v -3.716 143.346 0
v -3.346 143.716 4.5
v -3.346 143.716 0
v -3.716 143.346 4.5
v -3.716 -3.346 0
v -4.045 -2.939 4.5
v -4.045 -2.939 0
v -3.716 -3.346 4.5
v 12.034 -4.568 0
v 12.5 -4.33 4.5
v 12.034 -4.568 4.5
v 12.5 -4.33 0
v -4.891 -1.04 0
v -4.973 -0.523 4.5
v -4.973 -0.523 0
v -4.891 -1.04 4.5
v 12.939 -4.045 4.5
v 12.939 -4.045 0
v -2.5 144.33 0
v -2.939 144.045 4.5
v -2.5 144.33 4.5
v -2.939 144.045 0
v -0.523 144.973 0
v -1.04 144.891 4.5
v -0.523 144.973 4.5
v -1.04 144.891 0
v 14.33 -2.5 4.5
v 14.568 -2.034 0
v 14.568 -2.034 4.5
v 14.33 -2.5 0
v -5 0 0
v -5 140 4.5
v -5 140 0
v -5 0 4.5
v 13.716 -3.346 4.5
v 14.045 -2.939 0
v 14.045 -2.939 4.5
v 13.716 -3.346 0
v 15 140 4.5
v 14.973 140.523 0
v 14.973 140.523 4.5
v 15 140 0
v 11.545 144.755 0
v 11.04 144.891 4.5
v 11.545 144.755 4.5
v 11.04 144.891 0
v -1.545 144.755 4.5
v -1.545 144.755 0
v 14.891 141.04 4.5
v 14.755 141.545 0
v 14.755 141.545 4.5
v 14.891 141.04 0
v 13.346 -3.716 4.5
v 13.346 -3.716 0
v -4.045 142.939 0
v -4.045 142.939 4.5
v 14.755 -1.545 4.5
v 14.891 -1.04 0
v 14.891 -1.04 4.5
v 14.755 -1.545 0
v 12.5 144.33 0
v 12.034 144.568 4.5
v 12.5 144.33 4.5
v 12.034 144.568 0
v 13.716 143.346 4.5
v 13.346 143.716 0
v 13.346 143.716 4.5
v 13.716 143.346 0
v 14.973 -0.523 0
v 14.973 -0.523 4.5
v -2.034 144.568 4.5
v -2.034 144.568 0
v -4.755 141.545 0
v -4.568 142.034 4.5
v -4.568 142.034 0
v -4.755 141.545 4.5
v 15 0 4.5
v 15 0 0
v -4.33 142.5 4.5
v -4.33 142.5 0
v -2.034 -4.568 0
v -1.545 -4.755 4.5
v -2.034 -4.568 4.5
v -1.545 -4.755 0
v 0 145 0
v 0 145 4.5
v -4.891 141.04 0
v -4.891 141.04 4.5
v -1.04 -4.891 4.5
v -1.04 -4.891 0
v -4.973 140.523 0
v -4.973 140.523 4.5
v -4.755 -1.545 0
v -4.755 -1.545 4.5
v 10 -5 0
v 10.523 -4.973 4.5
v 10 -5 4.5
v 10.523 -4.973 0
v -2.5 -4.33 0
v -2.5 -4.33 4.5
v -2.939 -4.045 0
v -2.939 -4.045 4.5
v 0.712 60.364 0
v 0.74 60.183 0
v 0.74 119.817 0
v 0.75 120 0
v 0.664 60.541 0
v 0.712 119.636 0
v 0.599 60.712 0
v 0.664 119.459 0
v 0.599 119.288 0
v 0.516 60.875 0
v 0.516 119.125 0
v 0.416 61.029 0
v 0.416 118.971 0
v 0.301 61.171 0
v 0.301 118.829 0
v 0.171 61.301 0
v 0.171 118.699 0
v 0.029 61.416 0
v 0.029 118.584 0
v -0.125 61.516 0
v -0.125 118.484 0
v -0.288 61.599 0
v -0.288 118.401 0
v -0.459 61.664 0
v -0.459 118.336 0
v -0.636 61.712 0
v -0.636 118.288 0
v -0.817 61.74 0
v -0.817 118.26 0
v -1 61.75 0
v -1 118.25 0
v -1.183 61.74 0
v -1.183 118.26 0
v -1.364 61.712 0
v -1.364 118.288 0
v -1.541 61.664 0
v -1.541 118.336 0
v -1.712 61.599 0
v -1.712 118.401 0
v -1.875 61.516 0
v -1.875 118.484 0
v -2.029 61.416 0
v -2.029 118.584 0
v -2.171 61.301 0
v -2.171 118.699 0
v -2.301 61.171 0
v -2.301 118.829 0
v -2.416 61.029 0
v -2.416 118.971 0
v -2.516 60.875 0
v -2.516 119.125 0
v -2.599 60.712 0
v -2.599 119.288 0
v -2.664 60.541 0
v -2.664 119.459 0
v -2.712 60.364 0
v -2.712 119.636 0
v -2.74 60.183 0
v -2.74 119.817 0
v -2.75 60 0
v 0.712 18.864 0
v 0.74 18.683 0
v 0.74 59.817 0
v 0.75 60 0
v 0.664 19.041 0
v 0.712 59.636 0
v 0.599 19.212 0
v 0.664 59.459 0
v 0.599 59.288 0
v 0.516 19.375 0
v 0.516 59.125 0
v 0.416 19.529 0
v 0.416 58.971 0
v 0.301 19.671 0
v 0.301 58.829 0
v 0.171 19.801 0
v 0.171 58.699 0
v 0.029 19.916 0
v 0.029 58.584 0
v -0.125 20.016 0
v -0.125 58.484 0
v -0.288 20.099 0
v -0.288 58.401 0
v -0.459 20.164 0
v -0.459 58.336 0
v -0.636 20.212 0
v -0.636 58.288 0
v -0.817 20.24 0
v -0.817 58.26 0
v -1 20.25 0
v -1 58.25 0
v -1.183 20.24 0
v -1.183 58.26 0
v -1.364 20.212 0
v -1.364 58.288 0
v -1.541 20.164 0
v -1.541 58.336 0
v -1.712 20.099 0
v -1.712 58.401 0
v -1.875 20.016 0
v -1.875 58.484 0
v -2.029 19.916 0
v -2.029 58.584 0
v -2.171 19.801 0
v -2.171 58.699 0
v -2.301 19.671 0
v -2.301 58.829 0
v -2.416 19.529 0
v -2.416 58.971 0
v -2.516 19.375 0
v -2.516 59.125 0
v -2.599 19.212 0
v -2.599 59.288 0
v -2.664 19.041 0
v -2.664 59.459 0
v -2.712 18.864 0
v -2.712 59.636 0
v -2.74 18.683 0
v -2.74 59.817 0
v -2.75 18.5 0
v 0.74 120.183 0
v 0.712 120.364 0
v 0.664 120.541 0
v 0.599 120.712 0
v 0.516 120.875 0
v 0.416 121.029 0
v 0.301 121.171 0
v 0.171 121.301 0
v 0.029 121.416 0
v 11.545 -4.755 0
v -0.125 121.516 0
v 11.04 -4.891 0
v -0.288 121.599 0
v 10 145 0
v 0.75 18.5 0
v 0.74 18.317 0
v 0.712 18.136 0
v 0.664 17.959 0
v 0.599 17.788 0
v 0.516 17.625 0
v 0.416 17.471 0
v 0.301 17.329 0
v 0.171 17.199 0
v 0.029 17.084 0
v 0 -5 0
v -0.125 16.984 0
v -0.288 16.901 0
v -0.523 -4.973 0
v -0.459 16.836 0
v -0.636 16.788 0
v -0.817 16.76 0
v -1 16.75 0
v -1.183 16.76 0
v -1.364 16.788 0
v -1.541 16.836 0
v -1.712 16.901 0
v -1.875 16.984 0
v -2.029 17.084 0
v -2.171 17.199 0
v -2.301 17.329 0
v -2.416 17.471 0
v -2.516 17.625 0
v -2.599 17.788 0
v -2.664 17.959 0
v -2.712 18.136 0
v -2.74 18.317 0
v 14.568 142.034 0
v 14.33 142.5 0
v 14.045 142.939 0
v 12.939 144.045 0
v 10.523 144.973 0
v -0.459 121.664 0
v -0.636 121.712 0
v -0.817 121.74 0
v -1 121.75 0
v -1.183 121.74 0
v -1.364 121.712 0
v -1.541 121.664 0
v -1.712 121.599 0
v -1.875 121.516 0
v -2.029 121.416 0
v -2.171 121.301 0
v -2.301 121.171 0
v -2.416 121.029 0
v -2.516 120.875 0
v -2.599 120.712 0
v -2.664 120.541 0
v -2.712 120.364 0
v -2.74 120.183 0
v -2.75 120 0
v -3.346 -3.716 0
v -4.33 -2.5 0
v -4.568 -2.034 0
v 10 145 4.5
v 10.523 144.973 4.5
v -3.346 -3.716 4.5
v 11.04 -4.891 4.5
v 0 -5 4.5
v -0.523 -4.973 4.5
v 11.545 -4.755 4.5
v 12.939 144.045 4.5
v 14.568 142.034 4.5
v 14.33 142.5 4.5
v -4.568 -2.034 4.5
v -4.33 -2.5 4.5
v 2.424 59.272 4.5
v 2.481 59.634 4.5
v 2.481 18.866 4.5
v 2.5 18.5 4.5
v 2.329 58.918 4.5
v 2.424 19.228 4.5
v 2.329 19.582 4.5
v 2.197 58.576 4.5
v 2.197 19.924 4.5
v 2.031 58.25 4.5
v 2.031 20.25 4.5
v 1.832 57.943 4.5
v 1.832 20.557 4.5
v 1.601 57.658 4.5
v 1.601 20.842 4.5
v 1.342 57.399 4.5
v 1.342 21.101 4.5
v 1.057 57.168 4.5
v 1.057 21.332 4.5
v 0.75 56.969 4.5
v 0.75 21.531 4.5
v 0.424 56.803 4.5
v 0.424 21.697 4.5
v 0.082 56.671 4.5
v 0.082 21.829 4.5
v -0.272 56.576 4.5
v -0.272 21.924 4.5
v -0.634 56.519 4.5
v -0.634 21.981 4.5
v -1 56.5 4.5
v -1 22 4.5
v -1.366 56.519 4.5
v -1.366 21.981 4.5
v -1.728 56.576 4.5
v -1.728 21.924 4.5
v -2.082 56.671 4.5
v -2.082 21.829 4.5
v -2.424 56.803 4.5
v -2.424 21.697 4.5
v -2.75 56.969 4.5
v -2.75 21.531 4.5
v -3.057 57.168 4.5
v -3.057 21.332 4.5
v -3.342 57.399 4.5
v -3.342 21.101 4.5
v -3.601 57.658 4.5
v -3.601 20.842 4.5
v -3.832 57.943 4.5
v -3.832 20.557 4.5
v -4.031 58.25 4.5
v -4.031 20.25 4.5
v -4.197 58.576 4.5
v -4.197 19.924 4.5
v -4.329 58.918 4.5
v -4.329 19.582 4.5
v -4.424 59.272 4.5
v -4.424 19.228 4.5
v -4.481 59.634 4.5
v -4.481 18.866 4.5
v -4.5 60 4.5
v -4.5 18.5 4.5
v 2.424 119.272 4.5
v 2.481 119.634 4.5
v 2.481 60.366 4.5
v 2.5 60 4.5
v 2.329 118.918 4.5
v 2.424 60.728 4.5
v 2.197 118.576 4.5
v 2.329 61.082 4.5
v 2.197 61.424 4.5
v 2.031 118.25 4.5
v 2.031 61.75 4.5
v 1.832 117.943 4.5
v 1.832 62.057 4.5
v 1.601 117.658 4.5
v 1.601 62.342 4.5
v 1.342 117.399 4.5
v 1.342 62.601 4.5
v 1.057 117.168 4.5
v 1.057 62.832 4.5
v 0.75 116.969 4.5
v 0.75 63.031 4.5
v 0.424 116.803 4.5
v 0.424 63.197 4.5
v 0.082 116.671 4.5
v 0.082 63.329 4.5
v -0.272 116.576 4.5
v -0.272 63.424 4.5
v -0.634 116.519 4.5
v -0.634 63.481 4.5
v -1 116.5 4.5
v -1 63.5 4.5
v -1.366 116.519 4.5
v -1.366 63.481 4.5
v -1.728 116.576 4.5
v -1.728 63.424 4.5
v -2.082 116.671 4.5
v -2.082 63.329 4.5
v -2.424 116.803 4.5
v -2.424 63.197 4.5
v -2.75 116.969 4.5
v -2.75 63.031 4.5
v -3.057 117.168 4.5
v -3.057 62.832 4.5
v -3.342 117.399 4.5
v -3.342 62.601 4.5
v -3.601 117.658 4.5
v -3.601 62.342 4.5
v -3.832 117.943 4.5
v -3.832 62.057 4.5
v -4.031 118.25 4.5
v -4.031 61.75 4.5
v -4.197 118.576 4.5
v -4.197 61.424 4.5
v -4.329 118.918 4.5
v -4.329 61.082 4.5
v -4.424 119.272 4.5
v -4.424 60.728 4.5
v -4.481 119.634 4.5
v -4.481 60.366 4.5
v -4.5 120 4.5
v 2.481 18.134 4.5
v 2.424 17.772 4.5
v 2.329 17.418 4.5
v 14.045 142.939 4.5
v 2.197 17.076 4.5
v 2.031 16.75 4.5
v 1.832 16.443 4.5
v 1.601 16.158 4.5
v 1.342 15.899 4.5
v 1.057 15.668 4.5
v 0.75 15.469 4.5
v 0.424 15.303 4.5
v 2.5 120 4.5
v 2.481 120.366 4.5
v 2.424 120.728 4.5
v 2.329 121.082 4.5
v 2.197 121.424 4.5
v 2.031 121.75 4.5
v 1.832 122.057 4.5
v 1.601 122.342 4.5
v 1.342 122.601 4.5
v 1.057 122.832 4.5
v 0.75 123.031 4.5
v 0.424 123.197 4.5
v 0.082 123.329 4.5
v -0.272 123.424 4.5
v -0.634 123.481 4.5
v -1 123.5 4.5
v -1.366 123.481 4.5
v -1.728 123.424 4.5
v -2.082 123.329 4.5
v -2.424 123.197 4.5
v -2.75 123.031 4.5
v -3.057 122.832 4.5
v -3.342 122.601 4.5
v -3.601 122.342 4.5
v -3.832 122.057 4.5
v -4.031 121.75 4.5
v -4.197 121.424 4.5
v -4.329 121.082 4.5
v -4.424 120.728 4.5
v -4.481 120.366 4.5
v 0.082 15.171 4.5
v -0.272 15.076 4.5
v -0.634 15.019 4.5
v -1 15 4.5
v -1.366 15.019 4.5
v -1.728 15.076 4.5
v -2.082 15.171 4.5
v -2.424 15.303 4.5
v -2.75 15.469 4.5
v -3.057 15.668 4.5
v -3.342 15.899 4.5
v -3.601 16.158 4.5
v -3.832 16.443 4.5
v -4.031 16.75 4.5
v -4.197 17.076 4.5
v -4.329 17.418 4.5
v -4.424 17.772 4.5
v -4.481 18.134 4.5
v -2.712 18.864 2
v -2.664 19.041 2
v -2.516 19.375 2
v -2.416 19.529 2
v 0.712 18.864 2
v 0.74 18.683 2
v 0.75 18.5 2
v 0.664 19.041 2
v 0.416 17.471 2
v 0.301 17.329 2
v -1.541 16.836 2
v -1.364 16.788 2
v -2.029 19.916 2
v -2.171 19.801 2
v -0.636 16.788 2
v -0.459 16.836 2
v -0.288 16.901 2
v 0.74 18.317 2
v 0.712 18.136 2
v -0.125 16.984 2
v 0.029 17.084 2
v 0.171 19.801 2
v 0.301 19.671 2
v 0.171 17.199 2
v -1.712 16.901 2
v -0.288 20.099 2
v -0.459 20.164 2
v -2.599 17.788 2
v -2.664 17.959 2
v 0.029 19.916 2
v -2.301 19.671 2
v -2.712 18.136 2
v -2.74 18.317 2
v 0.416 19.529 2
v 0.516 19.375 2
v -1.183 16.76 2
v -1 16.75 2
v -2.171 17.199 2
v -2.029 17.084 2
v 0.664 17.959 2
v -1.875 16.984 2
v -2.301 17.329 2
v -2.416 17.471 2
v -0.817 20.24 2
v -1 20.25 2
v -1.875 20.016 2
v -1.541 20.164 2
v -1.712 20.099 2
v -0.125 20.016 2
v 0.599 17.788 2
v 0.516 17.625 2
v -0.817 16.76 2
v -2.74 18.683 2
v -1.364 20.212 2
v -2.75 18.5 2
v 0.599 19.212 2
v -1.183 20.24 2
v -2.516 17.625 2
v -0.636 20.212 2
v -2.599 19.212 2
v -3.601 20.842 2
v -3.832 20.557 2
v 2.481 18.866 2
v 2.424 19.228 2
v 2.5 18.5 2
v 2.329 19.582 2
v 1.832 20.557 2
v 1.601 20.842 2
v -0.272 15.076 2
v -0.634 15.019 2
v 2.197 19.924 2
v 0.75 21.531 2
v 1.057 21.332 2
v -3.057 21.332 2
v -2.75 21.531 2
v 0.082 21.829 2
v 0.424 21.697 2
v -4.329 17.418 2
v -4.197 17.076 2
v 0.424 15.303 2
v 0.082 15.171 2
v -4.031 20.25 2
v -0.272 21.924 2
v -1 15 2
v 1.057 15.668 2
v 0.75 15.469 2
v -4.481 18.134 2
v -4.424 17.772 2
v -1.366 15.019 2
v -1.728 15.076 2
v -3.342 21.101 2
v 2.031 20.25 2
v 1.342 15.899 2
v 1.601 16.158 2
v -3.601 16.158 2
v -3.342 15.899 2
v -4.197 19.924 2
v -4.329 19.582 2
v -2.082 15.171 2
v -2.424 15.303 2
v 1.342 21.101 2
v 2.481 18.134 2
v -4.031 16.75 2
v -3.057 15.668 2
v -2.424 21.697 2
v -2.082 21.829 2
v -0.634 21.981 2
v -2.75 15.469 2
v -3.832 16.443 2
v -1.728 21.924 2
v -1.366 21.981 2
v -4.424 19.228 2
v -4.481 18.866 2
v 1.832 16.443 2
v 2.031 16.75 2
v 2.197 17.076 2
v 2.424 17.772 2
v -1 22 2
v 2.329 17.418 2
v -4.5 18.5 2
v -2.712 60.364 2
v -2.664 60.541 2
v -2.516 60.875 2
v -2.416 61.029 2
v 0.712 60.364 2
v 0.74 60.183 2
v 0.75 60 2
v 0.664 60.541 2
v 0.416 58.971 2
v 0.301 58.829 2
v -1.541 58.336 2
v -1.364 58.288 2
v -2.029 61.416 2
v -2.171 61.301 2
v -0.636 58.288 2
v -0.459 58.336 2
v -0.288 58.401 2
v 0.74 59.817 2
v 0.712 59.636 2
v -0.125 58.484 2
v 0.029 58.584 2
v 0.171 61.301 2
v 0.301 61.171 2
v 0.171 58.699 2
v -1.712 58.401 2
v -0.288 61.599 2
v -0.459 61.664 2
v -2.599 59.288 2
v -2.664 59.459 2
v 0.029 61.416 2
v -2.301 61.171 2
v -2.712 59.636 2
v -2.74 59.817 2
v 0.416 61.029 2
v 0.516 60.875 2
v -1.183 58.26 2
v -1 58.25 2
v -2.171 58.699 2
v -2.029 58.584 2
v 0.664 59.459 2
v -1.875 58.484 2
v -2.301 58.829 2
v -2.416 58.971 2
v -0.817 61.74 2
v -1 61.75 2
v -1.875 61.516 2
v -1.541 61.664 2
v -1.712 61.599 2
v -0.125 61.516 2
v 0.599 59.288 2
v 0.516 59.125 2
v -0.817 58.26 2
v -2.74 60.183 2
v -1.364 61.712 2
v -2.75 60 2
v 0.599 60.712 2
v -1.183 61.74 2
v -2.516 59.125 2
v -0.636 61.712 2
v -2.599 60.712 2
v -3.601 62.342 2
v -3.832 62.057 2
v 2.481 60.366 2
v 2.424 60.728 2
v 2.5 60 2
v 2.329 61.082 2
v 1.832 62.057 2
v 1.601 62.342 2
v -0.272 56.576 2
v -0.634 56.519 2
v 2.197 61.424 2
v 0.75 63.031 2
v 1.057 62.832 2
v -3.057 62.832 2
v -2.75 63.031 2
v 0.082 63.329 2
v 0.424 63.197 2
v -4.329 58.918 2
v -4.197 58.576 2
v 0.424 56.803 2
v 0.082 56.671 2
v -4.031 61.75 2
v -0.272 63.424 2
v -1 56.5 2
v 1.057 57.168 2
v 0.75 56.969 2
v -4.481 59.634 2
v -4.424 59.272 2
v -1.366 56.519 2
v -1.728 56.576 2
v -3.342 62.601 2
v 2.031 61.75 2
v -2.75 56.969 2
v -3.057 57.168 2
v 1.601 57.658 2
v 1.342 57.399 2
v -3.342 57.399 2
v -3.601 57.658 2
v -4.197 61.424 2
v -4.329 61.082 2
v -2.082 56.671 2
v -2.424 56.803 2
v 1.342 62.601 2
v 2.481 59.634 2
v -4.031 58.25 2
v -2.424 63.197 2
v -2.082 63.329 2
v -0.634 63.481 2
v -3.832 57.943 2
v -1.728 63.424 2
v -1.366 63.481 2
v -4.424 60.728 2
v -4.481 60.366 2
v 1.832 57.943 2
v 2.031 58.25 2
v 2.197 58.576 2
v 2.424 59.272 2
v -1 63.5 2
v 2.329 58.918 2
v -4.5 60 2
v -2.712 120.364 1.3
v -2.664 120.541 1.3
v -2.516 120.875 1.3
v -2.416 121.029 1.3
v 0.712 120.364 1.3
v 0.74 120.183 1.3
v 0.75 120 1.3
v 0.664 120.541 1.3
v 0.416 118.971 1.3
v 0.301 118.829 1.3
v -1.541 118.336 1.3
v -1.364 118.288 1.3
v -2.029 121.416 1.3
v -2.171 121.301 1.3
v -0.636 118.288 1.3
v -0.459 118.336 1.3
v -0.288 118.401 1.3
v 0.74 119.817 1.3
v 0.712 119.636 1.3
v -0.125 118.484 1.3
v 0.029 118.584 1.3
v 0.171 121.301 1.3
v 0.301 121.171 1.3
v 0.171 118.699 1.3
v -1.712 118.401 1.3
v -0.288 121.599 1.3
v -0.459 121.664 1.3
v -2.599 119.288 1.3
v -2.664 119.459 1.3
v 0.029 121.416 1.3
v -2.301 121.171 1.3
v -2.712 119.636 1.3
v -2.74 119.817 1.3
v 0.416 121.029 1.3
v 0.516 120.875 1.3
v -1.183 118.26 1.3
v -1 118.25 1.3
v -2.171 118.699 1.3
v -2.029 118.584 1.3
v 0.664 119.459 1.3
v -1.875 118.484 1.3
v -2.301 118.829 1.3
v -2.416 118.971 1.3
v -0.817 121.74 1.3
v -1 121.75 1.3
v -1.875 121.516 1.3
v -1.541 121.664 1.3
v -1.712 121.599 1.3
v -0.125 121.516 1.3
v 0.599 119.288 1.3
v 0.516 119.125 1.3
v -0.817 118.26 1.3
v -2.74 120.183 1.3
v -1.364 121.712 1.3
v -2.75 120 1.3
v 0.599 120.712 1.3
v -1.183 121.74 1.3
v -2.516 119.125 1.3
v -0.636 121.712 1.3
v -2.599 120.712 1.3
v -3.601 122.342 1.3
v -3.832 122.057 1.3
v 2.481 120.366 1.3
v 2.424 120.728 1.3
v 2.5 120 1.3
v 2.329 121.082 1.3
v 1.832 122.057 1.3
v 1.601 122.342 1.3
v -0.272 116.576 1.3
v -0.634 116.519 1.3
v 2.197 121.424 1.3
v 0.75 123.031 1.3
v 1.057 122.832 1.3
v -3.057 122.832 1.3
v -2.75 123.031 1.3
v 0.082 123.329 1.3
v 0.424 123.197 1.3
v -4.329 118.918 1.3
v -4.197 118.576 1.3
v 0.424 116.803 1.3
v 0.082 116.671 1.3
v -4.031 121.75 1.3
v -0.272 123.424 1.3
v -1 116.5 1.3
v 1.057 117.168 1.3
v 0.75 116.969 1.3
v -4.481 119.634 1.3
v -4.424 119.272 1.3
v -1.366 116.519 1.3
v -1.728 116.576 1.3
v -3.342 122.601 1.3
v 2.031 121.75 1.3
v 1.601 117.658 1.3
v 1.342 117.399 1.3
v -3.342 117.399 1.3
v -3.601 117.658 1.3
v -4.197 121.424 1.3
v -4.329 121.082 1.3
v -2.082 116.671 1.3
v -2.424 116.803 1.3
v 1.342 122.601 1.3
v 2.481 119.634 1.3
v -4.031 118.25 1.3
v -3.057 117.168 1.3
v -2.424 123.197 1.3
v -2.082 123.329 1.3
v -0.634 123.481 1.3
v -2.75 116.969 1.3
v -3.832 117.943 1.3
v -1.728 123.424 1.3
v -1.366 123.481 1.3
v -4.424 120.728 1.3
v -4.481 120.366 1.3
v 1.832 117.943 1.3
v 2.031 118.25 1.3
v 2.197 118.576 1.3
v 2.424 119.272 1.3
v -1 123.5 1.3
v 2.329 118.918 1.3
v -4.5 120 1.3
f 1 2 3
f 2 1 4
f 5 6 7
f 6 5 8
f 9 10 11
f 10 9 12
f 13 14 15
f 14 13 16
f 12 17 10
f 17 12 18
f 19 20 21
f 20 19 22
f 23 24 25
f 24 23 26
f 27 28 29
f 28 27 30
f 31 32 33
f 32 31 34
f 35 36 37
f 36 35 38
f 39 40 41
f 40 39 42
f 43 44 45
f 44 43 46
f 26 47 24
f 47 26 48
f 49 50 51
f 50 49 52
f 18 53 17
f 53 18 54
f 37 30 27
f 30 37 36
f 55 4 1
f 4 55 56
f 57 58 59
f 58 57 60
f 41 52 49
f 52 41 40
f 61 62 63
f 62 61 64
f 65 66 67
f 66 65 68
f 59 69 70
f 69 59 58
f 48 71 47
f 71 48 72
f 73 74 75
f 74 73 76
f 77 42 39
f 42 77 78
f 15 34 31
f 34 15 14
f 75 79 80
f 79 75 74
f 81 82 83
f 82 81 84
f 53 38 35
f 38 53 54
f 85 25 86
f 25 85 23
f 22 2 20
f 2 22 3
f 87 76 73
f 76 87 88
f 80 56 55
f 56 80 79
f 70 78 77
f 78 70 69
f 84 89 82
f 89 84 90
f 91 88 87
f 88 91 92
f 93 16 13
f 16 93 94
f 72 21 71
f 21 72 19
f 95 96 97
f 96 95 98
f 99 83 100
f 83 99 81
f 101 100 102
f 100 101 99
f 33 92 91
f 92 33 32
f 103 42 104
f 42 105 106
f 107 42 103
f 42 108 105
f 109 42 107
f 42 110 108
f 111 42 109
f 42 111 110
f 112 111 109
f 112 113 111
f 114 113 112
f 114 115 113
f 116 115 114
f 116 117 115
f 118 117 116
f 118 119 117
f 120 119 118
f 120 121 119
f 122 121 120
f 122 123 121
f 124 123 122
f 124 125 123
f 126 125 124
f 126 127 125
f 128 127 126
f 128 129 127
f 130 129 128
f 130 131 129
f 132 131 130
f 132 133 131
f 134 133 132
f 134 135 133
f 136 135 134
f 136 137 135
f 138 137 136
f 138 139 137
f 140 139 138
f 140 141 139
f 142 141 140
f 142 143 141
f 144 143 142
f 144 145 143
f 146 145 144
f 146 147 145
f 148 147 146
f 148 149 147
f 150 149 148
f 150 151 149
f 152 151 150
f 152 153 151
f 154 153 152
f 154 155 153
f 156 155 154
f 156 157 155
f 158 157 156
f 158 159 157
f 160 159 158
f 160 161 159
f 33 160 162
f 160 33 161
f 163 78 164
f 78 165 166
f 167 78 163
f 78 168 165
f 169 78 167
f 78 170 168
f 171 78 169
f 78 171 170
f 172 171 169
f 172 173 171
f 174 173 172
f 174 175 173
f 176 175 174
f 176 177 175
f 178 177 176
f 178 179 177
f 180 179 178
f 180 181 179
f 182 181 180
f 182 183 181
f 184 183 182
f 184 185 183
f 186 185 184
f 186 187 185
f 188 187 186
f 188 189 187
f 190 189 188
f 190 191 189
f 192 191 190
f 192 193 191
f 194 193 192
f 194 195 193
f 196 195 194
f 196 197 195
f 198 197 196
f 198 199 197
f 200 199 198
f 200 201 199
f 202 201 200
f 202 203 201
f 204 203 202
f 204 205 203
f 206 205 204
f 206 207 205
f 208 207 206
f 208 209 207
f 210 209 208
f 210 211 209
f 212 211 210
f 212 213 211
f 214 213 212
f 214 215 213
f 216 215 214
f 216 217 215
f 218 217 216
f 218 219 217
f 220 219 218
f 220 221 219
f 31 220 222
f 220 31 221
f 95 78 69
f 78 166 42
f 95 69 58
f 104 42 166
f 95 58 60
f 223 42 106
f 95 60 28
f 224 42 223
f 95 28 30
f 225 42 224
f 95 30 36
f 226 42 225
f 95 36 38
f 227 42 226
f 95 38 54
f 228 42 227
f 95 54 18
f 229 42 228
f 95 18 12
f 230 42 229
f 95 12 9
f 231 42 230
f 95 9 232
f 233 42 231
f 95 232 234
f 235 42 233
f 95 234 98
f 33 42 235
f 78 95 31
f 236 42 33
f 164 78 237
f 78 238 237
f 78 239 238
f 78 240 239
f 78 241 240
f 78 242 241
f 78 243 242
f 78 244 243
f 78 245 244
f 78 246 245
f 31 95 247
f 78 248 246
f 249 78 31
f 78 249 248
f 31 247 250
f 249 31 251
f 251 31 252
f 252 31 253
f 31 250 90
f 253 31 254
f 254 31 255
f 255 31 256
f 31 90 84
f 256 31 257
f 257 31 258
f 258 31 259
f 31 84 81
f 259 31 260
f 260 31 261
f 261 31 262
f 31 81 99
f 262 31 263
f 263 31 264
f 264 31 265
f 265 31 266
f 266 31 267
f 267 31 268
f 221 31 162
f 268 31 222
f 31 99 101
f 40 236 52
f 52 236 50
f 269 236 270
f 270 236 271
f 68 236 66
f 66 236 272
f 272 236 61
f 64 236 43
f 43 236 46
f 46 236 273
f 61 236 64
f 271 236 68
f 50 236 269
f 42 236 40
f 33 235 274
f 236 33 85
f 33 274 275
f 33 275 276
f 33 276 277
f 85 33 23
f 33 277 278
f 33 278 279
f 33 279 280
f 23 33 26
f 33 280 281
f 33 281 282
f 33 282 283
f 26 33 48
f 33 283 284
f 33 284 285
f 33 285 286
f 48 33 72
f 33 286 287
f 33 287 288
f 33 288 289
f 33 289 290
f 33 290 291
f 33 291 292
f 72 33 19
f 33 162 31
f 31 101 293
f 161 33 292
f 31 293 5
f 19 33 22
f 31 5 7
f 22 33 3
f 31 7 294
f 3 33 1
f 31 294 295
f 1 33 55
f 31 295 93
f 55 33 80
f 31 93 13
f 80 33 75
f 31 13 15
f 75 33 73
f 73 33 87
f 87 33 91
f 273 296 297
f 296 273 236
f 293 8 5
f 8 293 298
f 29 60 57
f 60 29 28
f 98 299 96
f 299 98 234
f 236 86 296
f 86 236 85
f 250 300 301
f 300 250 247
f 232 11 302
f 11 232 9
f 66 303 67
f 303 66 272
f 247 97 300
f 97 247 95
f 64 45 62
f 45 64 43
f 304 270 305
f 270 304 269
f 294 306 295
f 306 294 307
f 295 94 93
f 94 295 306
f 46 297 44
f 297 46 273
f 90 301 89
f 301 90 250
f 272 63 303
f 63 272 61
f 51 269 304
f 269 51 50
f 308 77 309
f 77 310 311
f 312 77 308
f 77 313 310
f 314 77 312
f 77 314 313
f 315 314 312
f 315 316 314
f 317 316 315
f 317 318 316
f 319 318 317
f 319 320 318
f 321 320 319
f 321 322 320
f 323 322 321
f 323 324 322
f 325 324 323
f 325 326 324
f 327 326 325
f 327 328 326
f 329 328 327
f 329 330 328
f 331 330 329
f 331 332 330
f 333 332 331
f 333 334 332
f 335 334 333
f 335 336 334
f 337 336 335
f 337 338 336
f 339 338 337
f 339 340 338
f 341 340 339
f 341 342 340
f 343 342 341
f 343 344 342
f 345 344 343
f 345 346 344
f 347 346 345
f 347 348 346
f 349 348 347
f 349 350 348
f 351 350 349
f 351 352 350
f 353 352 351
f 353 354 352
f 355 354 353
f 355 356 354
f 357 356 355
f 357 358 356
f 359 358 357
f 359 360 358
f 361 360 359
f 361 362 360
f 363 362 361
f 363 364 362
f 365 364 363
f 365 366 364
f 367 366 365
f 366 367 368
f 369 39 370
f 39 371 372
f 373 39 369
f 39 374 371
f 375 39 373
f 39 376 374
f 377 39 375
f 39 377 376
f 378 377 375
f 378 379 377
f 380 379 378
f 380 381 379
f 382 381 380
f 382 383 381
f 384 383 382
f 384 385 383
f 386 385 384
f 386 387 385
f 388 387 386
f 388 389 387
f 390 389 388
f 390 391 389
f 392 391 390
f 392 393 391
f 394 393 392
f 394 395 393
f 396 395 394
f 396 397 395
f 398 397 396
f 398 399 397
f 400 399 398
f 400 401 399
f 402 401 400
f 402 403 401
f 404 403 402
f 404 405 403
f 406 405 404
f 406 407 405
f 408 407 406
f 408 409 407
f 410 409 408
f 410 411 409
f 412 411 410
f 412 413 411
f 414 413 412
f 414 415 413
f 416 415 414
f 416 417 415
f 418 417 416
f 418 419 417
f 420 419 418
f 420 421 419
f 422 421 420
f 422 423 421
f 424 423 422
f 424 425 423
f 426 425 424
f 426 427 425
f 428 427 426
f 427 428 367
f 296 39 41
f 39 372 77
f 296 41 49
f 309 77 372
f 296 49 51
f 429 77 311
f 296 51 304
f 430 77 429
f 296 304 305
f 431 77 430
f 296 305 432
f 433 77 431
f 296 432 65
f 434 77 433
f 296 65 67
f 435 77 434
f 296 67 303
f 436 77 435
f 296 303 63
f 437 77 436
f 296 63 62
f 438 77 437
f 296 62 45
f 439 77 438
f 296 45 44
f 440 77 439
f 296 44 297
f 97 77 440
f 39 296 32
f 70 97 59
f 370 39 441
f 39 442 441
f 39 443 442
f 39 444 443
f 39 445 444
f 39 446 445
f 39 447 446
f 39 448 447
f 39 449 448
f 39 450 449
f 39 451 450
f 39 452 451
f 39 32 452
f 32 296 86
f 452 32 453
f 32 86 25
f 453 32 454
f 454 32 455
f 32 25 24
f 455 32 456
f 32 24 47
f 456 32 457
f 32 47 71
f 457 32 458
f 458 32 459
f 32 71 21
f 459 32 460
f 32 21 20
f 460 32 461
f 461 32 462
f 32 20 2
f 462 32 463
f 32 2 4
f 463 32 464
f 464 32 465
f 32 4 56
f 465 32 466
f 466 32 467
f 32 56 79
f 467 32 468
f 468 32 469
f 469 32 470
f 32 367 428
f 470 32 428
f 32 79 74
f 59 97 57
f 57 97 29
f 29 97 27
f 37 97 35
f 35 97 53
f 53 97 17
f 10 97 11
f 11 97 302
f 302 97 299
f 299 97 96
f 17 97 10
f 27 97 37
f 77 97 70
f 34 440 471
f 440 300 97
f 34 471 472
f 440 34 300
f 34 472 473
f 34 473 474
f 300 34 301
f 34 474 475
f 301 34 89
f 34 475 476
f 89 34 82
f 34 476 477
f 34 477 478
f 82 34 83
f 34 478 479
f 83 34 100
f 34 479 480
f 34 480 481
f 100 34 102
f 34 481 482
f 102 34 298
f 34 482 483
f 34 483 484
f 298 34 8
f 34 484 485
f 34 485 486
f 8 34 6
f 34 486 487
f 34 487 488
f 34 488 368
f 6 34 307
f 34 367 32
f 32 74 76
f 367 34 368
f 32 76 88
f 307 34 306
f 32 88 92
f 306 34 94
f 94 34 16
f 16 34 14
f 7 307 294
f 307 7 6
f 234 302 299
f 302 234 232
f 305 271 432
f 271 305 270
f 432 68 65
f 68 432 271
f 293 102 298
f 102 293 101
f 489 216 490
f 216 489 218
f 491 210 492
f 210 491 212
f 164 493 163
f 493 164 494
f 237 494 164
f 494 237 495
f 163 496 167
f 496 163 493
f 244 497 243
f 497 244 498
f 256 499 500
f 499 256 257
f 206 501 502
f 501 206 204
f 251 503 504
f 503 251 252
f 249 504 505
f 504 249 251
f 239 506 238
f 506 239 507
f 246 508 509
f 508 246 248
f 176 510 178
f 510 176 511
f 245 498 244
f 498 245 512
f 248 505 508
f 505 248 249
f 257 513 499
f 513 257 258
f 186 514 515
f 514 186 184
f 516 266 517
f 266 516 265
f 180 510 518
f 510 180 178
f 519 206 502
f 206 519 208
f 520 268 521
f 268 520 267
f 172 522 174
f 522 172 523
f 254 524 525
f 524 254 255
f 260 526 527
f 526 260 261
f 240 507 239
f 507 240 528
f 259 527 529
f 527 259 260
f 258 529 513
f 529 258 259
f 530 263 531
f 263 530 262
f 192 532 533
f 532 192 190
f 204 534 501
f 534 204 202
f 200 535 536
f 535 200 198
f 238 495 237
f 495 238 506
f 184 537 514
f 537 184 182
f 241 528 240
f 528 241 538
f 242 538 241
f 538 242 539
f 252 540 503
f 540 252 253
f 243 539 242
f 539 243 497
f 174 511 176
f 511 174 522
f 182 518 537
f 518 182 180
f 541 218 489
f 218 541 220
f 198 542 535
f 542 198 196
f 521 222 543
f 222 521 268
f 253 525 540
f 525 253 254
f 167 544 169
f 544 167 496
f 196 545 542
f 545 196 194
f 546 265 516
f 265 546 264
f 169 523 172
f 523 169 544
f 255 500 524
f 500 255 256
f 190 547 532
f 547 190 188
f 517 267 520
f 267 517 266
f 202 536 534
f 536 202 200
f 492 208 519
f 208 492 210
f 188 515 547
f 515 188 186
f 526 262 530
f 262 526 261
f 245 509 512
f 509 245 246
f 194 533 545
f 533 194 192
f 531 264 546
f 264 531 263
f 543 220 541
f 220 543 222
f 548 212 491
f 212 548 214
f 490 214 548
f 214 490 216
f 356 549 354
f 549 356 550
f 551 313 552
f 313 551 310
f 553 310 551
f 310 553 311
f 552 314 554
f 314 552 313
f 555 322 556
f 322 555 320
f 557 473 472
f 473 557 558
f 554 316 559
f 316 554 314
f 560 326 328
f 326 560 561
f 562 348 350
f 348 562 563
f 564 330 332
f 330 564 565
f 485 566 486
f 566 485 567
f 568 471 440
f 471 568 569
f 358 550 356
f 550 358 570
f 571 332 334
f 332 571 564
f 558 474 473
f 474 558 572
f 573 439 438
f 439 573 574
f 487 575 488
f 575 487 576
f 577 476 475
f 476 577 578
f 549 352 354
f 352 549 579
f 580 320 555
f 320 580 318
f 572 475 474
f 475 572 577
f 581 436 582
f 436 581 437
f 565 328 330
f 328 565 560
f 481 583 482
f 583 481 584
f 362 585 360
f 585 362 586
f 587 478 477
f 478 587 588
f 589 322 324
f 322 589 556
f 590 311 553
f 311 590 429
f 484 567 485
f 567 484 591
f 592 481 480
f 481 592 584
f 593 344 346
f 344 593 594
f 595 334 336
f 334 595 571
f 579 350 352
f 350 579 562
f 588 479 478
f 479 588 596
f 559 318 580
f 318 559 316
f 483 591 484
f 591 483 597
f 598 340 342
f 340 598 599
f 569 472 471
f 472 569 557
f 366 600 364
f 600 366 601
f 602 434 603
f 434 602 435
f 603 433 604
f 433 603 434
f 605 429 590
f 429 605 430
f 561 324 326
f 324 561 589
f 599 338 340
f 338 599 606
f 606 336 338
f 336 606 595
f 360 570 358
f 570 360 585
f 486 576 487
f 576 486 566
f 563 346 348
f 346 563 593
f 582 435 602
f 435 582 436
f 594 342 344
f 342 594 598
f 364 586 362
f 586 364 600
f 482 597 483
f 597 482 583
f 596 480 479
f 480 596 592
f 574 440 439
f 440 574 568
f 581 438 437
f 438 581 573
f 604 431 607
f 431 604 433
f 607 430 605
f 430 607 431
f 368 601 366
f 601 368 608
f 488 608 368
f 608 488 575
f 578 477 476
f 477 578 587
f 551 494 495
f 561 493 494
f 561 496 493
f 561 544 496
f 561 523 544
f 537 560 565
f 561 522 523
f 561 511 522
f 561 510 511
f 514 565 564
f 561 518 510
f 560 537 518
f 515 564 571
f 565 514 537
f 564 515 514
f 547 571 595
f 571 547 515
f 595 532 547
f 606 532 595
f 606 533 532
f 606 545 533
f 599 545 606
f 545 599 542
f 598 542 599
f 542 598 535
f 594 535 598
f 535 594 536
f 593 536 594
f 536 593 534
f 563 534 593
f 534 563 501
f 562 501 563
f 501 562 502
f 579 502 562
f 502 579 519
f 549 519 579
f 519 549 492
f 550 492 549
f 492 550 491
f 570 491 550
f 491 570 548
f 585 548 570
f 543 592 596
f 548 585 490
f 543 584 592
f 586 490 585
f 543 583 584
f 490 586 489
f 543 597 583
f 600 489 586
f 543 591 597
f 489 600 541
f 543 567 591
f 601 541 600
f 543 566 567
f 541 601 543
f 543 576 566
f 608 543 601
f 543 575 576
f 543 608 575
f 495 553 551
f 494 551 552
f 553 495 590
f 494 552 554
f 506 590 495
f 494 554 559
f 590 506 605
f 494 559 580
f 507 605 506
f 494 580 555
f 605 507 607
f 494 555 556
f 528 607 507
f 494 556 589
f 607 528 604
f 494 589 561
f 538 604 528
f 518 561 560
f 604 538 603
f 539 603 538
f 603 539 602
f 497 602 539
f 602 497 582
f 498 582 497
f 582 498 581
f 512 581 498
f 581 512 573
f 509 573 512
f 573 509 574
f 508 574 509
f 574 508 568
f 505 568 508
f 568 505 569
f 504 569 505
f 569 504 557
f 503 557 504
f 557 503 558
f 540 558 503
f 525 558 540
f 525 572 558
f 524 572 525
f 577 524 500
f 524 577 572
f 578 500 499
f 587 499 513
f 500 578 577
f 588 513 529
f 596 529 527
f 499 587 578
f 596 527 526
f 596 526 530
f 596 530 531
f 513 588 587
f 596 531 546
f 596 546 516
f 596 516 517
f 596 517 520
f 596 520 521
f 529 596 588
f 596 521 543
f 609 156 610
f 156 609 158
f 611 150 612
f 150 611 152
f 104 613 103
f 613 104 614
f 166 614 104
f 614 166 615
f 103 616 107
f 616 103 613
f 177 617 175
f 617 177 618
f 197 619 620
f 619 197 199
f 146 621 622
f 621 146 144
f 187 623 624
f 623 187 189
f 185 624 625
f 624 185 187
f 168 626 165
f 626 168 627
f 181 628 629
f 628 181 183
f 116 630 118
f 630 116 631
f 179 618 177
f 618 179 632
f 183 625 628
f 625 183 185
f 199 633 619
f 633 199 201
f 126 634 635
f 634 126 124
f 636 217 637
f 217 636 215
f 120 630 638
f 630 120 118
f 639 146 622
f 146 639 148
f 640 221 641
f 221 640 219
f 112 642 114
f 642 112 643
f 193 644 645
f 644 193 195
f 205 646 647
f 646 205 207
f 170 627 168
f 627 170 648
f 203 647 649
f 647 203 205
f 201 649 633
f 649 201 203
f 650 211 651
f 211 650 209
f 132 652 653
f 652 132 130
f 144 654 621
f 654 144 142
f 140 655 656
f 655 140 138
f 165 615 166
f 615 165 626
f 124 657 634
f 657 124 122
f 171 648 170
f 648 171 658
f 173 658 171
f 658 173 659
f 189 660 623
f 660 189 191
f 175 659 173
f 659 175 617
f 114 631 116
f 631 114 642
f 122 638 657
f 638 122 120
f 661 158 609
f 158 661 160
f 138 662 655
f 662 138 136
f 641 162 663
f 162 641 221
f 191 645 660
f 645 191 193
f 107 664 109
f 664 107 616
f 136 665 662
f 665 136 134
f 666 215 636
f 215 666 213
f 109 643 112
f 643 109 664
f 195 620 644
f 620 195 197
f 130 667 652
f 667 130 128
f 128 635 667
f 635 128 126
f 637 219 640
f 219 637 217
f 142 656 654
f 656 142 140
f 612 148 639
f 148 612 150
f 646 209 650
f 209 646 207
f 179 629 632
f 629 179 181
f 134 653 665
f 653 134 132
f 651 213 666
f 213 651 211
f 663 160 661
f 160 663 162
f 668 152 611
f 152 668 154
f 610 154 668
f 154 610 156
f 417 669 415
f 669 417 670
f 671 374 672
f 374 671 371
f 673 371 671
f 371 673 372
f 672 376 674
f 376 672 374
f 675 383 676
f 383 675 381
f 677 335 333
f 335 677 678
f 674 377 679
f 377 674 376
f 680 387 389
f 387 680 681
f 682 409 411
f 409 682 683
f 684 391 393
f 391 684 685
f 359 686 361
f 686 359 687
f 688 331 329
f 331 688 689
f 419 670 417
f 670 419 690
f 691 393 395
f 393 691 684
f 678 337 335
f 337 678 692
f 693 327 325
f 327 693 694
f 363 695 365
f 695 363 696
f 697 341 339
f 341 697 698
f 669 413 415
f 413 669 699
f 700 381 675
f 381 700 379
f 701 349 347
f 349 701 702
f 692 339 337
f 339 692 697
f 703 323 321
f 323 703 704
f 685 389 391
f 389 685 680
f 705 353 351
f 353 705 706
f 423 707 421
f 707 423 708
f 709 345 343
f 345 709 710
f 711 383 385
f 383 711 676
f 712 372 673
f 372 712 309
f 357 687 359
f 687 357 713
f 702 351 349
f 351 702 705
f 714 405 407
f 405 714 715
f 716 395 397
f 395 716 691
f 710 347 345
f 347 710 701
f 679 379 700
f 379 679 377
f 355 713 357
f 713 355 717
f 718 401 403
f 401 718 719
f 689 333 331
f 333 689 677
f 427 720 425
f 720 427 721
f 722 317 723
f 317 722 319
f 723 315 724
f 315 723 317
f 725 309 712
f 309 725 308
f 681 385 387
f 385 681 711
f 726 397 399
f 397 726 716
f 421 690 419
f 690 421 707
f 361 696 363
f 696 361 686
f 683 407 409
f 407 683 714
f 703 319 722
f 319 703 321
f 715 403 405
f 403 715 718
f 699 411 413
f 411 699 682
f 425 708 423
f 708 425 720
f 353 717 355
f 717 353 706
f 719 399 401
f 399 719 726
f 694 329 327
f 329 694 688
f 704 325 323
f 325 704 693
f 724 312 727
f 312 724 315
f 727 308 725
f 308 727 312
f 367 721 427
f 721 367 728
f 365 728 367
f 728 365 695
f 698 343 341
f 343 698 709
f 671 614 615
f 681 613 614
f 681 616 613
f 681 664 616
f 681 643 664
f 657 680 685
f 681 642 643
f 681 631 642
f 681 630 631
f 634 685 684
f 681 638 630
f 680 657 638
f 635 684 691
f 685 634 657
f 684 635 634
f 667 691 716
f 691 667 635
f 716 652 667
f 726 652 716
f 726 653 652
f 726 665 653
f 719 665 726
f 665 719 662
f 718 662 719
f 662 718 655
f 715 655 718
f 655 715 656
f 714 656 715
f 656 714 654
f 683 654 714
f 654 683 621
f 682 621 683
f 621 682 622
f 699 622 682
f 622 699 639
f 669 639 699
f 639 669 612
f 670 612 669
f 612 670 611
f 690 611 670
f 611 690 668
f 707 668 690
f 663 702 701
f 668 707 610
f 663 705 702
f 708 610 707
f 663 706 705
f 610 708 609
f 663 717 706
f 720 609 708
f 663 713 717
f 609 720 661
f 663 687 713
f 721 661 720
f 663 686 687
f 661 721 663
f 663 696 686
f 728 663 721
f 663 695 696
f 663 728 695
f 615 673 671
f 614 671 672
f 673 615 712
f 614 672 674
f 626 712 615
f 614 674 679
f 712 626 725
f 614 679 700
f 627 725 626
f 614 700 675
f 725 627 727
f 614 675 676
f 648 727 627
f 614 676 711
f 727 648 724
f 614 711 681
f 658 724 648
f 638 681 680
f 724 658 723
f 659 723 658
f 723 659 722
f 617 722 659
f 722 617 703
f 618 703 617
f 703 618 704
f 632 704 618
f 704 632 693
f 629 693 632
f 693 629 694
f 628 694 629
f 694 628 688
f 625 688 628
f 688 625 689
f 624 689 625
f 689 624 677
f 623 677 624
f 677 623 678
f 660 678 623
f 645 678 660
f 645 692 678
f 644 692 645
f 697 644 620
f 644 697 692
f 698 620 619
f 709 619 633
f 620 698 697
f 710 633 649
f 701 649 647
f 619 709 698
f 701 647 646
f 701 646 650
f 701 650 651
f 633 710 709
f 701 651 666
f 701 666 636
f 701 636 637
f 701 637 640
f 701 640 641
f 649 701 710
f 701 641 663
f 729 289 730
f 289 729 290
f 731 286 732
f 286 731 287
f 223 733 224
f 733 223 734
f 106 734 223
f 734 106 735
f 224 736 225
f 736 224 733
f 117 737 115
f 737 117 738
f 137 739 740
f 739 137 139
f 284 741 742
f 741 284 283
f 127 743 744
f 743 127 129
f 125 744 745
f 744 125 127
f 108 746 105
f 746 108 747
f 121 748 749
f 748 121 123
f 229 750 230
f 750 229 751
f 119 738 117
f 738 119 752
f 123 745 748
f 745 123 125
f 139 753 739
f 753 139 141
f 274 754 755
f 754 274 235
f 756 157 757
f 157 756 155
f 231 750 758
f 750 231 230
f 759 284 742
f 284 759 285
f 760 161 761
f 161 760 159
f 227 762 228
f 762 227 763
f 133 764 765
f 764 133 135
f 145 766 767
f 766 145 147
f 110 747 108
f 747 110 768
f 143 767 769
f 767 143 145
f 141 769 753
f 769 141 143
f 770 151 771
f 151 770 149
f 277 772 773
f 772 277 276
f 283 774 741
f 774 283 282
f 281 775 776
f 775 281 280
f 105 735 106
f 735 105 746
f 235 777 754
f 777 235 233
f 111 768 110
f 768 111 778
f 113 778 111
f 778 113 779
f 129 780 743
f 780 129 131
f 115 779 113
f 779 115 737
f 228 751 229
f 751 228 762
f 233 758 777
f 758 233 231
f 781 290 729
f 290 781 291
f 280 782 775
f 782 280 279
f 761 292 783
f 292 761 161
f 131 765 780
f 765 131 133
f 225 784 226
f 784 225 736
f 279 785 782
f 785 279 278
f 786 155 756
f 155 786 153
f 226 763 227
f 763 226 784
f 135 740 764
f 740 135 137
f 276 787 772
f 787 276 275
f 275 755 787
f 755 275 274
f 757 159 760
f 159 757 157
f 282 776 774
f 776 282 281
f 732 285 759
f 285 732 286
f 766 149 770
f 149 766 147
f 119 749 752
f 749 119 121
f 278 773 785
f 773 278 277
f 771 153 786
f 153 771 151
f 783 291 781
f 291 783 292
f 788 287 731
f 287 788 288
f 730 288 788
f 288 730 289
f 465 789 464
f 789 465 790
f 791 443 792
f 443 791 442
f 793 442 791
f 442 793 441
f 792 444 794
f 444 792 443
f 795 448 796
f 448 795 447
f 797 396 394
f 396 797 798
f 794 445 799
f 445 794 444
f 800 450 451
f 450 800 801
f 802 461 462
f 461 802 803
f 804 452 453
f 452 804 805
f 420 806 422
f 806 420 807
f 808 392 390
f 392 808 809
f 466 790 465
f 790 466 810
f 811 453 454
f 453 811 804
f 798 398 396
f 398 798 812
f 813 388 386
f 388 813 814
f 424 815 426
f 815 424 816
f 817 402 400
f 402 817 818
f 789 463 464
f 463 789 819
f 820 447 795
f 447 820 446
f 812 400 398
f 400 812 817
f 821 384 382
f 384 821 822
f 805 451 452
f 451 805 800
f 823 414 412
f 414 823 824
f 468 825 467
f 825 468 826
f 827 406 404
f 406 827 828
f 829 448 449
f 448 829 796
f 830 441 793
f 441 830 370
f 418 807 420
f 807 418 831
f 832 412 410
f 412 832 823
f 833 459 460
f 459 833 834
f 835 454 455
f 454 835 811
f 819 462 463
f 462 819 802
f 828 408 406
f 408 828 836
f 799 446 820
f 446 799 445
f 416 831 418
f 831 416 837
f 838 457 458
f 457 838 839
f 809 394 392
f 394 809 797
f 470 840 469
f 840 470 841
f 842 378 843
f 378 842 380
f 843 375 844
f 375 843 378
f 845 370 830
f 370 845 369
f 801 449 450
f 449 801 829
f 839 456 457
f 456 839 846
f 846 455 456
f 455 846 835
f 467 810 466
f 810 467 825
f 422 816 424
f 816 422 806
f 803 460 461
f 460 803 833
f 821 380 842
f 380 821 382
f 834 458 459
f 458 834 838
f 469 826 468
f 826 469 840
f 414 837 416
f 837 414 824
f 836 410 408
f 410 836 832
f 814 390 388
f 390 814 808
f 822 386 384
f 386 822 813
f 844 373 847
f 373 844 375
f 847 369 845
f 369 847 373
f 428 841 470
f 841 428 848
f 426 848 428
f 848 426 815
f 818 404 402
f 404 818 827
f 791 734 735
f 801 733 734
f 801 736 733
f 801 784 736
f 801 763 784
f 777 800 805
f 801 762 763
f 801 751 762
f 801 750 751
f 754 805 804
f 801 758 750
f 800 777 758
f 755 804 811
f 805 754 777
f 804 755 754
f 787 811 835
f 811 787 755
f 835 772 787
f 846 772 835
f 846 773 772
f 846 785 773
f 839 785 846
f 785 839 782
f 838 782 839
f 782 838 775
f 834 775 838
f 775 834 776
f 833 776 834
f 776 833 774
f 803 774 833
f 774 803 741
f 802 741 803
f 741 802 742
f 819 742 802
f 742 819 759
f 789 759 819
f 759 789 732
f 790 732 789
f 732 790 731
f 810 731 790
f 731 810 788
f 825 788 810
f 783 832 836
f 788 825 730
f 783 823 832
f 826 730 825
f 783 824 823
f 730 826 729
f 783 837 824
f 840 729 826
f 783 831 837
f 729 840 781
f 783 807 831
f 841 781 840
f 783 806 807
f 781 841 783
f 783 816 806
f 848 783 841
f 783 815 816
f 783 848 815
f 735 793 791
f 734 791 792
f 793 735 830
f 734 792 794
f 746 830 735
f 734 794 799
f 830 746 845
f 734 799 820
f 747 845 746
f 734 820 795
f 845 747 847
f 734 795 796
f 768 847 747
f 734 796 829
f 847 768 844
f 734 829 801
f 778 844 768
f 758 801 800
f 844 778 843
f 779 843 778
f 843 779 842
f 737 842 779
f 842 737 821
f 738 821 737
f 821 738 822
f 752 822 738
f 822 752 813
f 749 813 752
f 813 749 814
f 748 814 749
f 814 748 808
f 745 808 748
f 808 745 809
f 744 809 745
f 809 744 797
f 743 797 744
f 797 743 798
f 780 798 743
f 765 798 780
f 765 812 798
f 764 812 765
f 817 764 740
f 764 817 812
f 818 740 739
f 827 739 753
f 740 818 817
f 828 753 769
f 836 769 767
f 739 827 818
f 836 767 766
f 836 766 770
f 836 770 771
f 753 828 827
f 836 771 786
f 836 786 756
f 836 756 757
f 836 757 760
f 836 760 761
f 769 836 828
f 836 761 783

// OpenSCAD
/*
 * HP drive rail
 *
 * Rails for mounting drives in a HP ProLiant ML150
 *
 * Copyright 2012 <b@Zi.iS>
 * License CC BY 3.0
 */

$fn=60;
offset = 6; // 6=left rail, -6= right rail

difference() {


	minkowski() {
		cube([
			20-10,
			150-10,
			3.5
		]);
		cylinder(
			r=5
		);
	}
	
	translate([
		10-offset-5,
		23.5-5,
		-1
	]) {
		cylinder(
			r = 3.5/2,
			h=10
		);
	}
	translate([
		10-offset-5,
		23.5-5,
		2
	]) {
		cylinder(
			r = 7/2,
			h=10
		);
	}

	translate([
		10-offset-5,
		65-5,
		-1
	]) {
		cylinder(
			r = 3.5/2,
			h=10
		);
	}
	translate([
		10-offset-5,
		65-5,
		2
	]) {
		cylinder(
			r = 7/2,
			h=10
		);
	}

	translate([
		10-offset-5,
		125-5,
		-1
	]) {
		cylinder(
			r = 3.5/2,
			h=10
		);
	}
	translate([
		10-offset-5,
		125-5,
		1.3
	]) {
		cylinder(
			r = 7/2,
			h=10
		);
	}

}
